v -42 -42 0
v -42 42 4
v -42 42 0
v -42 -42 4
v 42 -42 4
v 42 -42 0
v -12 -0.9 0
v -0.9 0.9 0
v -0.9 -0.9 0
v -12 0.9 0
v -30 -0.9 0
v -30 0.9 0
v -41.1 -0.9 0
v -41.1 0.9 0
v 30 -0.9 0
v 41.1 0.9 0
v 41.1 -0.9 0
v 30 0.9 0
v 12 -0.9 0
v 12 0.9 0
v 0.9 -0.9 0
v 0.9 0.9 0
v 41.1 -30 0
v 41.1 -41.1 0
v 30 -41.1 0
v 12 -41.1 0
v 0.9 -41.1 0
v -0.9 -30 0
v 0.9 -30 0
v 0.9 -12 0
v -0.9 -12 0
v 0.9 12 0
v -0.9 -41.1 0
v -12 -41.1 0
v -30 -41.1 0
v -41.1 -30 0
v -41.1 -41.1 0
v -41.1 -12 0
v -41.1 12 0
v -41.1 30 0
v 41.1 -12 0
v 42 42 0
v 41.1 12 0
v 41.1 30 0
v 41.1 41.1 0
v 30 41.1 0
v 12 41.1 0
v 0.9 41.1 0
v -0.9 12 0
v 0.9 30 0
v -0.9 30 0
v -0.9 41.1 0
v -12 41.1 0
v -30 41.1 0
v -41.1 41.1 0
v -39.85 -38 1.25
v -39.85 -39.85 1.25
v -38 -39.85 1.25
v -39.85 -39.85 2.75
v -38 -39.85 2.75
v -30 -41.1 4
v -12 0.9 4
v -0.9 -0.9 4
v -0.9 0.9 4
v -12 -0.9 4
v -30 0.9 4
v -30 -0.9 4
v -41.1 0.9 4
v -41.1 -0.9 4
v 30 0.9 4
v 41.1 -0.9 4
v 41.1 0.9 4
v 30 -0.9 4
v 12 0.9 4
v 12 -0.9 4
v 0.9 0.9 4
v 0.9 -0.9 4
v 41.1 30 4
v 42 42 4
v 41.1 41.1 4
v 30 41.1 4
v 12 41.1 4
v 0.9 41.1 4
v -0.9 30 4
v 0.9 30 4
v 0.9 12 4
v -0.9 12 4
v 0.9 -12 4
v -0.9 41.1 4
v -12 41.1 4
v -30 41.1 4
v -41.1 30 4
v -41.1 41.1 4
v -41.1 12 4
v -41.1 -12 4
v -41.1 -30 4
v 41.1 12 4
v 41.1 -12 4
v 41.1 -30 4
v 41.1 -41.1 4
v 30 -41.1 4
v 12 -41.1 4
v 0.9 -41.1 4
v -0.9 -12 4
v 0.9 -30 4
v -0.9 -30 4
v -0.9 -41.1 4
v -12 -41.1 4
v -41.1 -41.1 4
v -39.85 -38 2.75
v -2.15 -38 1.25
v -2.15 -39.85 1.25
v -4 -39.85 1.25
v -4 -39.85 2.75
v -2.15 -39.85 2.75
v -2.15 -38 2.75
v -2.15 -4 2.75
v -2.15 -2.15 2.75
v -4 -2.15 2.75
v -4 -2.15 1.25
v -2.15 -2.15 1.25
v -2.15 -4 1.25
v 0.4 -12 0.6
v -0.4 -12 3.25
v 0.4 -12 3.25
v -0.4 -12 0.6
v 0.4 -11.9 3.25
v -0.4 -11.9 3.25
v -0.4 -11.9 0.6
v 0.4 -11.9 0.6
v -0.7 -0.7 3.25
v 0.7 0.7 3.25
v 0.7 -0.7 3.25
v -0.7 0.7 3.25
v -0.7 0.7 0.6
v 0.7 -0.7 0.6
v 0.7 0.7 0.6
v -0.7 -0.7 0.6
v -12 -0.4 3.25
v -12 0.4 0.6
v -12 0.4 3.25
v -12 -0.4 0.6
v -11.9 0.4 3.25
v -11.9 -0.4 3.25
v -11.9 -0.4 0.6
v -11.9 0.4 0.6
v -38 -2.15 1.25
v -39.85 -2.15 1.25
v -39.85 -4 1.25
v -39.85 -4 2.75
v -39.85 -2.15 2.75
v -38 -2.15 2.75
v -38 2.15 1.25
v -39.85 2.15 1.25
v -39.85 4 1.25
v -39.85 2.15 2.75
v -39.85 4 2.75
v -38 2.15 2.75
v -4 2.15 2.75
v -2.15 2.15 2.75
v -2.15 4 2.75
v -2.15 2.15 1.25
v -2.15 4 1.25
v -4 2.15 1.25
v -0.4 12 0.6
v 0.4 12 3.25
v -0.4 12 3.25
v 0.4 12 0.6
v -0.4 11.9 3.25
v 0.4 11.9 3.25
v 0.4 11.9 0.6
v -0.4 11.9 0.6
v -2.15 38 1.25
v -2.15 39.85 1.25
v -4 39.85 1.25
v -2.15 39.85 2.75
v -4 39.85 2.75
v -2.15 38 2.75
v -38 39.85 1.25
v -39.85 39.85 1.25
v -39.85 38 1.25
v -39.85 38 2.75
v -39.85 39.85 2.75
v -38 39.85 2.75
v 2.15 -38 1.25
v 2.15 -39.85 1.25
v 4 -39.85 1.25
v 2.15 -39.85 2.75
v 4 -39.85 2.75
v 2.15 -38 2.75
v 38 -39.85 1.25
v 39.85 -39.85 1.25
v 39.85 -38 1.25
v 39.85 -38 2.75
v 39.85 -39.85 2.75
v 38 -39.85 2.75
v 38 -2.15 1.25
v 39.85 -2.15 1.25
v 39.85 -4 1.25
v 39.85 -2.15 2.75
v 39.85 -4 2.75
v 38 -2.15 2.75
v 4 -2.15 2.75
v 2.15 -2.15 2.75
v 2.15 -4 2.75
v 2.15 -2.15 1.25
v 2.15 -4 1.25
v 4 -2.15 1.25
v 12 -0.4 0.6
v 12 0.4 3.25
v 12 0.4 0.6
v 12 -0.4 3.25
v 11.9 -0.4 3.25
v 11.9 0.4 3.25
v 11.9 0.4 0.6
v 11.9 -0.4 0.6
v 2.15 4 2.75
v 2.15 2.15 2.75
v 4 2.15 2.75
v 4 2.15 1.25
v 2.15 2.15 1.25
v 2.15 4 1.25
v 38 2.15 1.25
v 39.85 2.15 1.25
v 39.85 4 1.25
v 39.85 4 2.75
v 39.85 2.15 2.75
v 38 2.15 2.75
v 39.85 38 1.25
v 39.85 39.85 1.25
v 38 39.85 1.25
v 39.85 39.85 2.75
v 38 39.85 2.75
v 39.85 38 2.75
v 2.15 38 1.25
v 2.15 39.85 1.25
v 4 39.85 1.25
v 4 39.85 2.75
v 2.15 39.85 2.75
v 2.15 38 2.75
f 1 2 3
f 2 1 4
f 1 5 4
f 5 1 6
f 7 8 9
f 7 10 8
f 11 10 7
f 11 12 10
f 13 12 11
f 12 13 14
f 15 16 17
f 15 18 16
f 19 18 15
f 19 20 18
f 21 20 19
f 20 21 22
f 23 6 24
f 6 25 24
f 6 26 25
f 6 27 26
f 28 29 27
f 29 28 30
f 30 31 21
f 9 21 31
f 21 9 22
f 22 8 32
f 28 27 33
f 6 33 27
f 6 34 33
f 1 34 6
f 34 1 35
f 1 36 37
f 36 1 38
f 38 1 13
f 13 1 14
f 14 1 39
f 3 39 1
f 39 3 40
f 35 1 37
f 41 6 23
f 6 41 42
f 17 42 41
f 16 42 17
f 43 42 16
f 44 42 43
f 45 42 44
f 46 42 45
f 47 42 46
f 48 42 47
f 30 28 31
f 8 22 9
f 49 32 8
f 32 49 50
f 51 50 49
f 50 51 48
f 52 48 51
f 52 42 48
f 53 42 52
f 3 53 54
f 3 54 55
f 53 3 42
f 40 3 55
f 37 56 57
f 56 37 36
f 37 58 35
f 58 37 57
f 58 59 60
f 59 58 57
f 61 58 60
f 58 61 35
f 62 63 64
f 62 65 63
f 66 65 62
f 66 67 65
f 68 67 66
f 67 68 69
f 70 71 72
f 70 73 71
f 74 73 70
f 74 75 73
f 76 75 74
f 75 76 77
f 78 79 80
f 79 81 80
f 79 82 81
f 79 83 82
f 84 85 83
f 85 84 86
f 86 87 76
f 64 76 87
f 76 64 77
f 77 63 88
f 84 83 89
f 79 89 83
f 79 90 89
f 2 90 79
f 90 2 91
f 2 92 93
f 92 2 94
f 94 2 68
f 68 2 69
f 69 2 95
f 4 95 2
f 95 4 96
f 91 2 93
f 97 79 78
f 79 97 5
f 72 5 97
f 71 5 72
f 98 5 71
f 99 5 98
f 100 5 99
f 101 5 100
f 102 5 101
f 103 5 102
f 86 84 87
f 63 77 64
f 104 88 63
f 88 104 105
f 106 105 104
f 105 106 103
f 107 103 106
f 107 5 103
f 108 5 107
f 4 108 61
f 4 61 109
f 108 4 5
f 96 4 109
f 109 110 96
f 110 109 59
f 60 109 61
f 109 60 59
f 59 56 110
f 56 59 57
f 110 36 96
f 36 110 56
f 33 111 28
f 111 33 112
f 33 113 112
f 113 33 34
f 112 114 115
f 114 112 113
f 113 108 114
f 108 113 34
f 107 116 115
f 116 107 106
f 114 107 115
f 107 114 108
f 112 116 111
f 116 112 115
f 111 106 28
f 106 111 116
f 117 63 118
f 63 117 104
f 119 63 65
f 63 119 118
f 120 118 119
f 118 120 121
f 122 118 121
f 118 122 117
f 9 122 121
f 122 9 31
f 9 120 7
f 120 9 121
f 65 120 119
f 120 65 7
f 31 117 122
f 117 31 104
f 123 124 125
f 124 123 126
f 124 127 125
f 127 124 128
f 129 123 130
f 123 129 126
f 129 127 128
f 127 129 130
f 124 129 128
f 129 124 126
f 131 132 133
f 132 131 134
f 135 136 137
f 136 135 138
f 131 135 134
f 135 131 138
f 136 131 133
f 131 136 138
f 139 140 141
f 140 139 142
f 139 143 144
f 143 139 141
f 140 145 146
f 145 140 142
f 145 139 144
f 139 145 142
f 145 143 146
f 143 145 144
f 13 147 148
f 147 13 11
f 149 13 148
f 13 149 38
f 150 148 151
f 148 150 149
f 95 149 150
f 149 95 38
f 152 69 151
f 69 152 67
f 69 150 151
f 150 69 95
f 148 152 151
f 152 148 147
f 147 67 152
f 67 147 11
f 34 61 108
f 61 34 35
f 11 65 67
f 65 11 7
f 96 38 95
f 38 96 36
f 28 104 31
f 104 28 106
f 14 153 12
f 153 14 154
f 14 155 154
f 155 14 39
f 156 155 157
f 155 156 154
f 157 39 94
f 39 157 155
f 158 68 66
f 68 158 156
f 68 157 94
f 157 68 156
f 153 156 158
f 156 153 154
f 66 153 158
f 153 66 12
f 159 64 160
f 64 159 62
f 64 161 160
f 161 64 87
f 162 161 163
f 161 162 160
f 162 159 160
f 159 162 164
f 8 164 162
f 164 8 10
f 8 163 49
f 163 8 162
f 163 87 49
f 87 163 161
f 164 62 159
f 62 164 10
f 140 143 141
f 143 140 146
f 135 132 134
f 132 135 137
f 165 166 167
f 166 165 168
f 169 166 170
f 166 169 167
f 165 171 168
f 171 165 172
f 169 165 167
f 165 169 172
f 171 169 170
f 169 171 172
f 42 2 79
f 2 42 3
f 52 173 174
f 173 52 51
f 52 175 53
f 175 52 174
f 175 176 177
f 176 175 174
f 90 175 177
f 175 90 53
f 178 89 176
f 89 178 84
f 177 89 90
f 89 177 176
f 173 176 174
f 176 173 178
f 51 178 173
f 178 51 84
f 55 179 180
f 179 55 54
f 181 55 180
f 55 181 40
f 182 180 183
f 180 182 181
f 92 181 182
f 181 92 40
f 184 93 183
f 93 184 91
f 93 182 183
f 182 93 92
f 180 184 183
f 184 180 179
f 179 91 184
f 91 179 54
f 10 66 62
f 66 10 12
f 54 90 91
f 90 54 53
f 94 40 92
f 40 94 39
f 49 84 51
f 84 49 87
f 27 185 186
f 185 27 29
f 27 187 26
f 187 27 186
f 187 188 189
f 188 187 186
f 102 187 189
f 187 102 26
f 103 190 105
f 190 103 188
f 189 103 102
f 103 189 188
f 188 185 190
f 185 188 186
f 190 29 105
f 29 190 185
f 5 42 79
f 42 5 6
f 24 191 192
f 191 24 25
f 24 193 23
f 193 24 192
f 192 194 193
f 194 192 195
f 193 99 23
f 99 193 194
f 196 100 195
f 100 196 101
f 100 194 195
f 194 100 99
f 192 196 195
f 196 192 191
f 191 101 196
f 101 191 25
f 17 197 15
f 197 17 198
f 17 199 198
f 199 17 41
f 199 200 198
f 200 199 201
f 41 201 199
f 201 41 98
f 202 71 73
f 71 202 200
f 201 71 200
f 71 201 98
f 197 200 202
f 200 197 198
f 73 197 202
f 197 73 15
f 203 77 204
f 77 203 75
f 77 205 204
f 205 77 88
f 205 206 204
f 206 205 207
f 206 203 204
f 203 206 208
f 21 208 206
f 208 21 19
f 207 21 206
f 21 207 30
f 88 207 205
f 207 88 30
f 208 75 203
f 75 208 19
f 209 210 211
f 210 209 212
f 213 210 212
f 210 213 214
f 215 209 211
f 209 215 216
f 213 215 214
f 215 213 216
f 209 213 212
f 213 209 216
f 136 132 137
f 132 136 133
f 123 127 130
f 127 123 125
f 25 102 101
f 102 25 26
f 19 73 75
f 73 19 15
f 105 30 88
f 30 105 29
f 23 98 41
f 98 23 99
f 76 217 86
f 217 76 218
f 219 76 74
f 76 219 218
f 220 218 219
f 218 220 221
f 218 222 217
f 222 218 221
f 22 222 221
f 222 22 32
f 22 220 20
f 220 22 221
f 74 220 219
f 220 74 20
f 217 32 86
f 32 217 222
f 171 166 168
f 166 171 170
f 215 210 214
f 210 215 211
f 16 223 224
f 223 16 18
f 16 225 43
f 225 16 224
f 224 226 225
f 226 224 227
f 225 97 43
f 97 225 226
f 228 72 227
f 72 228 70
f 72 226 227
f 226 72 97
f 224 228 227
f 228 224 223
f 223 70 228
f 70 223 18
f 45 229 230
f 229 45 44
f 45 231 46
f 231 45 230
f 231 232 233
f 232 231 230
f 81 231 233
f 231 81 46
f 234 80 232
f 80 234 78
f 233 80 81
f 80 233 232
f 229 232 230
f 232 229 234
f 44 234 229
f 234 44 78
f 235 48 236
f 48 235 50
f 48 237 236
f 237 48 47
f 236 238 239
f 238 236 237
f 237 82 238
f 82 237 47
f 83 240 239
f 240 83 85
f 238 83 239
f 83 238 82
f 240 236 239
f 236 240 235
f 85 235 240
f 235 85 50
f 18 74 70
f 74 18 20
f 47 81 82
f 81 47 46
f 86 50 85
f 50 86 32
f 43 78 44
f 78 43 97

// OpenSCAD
// ============================================================
//  AT Ultra-Light Gridfinity Base  —  parametric assembler
// ============================================================
//  Self-contained: all geometry is inlined as polyhedron() below, so
//  this single file runs anywhere (incl. MakerWorld's Parametric Model
//  Maker / customizer) with no external STL dependencies.
//
//  Open in OpenSCAD, then: Window menu -> Customizer to get the
//  dropdown + sliders below. F5 = preview, F6 = render, then
//  File -> Export -> Export as STL.
// ============================================================

/* [Model] */
// Which base style to build
model = "rigid"; // [rigid:Beam, net_rigid:Beam+]

/* [Grid] */
// Squares wide
columns = 2; // [1:0.5:10]
// Squares deep
rows = 2;    // [1:0.5:10]

/* [Drawer Spacers] */
// Outward spacer on each side (mm) so the plate sits flush in a drawer. 0 = none.
// Capped at 41 mm — past that, just add another Gridfinity cell instead.
// Front is the side closest to you when you place the grid on a surface
ext_front = 0; // [0:0.5:41]
// Back is the side furthest from you
ext_back  = 0; // [0:0.5:41]
// Left will be to your left
ext_left  = 0; // [0:0.5:41]
// Right will be to your right
ext_right = 0; // [0:0.5:41]

/* [Custom Shape] */

// Remove squares from row 1 left
row_1_left = 0; // [0:1:9]
// Remove squares from row 1 right
row_1_right = 0; // [0:1:9]
// Remove squares from row 2 left
row_2_left = 0; // [0:1:9]
// Remove squares from row 2 right
row_2_right = 0; // [0:1:9]
// Remove squares from row 3 left
row_3_left = 0; // [0:1:9]
// Remove squares from row 3 right
row_3_right = 0; // [0:1:9]
// Remove squares from row 4 left
row_4_left = 0; // [0:1:9]
// Remove squares from row 4 right
row_4_right = 0; // [0:1:9]
// Remove squares from row 5 left
row_5_left = 0; // [0:1:9]
// Remove squares from row 5 right
row_5_right = 0; // [0:1:9]
// Remove squares from row 6 left
row_6_left = 0; // [0:1:9]
// Remove squares from row 6 right
row_6_right = 0; // [0:1:9]
// Remove squares from row 7 left
row_7_left = 0; // [0:1:9]
// Remove squares from row 7 right
row_7_right = 0; // [0:1:9]
// Remove squares from row 8 left
row_8_left = 0; // [0:1:9]
// Remove squares from row 8 right
row_8_right = 0; // [0:1:9]
// Remove squares from row 9 left
row_9_left = 0; // [0:1:9]
// Remove squares from row 9 right
row_9_right = 0; // [0:1:9]
// Remove squares from row 10 left
row_10_left = 0; // [0:1:9]
// Remove squares from row 10 right
row_10_right = 0; // [0:1:9]

/* [Advanced] */
// Center on the plate
centered = true;
// Grid spacing in mm (42: standard gridfinity, 84: double, 168: quad)
pitch = 42;      // [21:1:168]

// Customize the preview color to match your filament. Use standard HTML color codes: e.g. #ff0000 for red. This does not affect the model output.
preview_color = "#0099ff";

// ---- end of Customizer parameters --------------------------
// Everything below is internal. The [Hidden] group keeps these
// constants (beam_len, ext_base_len, rail_*, etc.) out of the
// OpenSCAD / MakerWorld Customizer UI.
/* [Hidden] */

// Corner footprint along an edge (mm). Solid and Solid+ share the 12mm corner.
corner_size = (model == "rigid" || model == "net_rigid") ? 12 : 5;

// Connector cross-section: width (across the edge) x height (up). Solid+ (net_rigid)
// uses the same 0.9 x 4.0 connector as Solid (rigid) — it looks just like Solid; only
// its outer-perimeter corners differ (see corner_part).
conn_w = model == "net_light" ? 0.5 :
         model == "net_heavy" ? 2.15 :
                                0.9;   // rigid + net_rigid
conn_h = (model == "rigid" || model == "net_rigid") ? 4.0 : 0.5;

// ------------------------------------------------------------
// One corner, already normalized (outer corner at the origin, in the +X +Y quadrant
// with the profile facing the cell centre). Solid (rigid) and Solid+ (net_rigid)
// distinguish corner roles by how many of the corner's two edges lie on the plate
// boundary:
//   both edges on boundary  -> `outer` corner (a true plate corner)
//   one edge on boundary    -> `innerouter` corner (sits mid-edge: one side is the
//                              perimeter wall, the other mates with the neighbouring cell)
//   neither edge on boundary -> `inner` corner (fully interior, where four cells meet)
// `outer` is true whenever at least one edge is on the boundary; `both` narrows that to a
// true plate corner. Solid+ adds the `plus` role: where the on-boundary edge is *exposed*
// (no drawer spacer) it mates with a neighbouring print, so it swaps in the special Solid+
// outer/innerouter mesh; a spacered boundary edge falls back to the plain Solid corner.
//
// The InnerOuter mesh is asymmetric — its outer (perimeter) edge runs along local +X and
// its inner (mating) edge along local +Y. rcell places every corner so local +X points at
// that corner's "canonical" boundary side; when the actual boundary edge is the *other*
// one, `swap` mirrors the mesh across its diagonal (swap X/Y) to put the perimeter wall on
// the right edge. `open` marks a corner whose two adjacent squares are present but whose
// diagonal square was removed by a Custom Shape cut (a re-entrant plate corner). Solid+
// must NOT use the fully-interior corner there: its edge-connector clip only fits an
// intersection where every square-corner presents the connectable outer profile, so any
// missing square at the intersection forces the outer piece on all corners around it.
// Plain Solid has no clip and keeps the interior corner. `plus`/`outer`/`both`/`swap`/
// `open` are supplied by rcell; the flexible-net models ignore them all.
module corner_part(plus = true, outer = true, both = true, swap = false, open = false) {
    if      (model == "net_light")                        mesh_corner_net_light();
    else if (model == "net_heavy" || model == "net_beam") mesh_corner_net_heavy();
    else if (model == "net_rigid") {
        if      (plus && both)  mesh_corner_net_rigid_outer();
        else if (plus)          diag(swap) mesh_corner_net_rigid_innerouter();
        else if (outer && both) mesh_corner_rigid_outer();
        else if (outer)         diag(swap) mesh_corner_rigid_innerouter();
        else if (open)          mesh_corner_net_rigid_outer();
        else                    mesh_corner_rigid_inner();
    }
    else {  // rigid / Solid
        if      (outer && both) mesh_corner_rigid_outer();
        else if (outer)         diag(swap) mesh_corner_rigid_innerouter();
        else                    mesh_corner_rigid_inner();
    }
}

// Mirror children across the corner's diagonal (swap X/Y) when `s` is set — used to flip an
// asymmetric InnerOuter corner so its perimeter wall lands on the correct edge.
module diag(s) {
    if (s) multmatrix([[0,1,0,0],[1,0,0,0],[0,0,1,0],[0,0,0,1]]) children();
    else   children();
}

// ------------------------------------------------------------
// Drawer-spacer extension. The source STL is a 5mm-long triangular prism authored at
// [295..300, 250..253.5, 0..3.5]. Its cross-section (in Y-Z) is a tall 3.5mm "ridge"
// face at Y=250 that tapers down to ~0.5mm at Y=253.5 — the chamfered triangle that
// lines up with a corner. The prism axis (X) is the direction it sticks outward.
ext_base_len = 5;   // authored prism length (mm); we scale this to the requested distance

// Spacer tie-rail: a beam run along the far (outer) edge of the spacers to lock the
// otherwise-cantilevered prisms together. Always the Net Heavy connector profile
// (2.15 wide across the edge x 0.5 tall), regardless of the chosen model.
rail_w = 2.15;
rail_h = 0.5;

// One extension prism, normalized so the mating face is at X=0 and the tall ridge edge
// is at Y=0, tapering toward +Y and sitting on the bed (Z 0..3.5). Stretched along +X
// (outward) to length L, with a tiny inward overlap so it welds cleanly to the plate.
module extension_part(L) {
    eps = 0.02;
    if (L > 0)
        translate([-eps, 0, 0])
            scale([(L + eps) / ext_base_len, 1, 1])
                translate([-295, -250, 0])
                    mesh_extension();
}

// The "Net Beam" model pairs the Net Heavy corner with this taller beam connector: an
// L-shaped section (a 0.5mm-thick web rising to 4mm at the outer rim, plus a 0.5mm-tall
// foot reaching 2.15mm inward). Imported rather than drawn as a cube because the profile
// isn't a box. Authored 10mm long at X 305..315, web face at Y=230, on the bed (Z 0..4).
beam = (model == "net_beam");
beam_len = 10;

// Beam normalized to web-at-Y=0, foot toward +Y, running along +X scaled to len.
module beam_x(len) {
    scale([len / beam_len, 1, 1]) translate([-305, -230, 0]) mesh_beam();
}
// Same beam turned to run along +Y with its web at X=0, foot toward +X (swap X/Y).
module beam_y(len) {
    multmatrix([[0,1,0,0],[1,0,0,0],[0,0,1,0],[0,0,0,1]]) beam_x(len);
}

// Connector beams: walls that bridge between corners along one edge, flush to the outer
// rim and sitting on the bed. Most models use a simple cube (conn_w x conn_h); Net Beam
// substitutes the imported L-section. The length is "scaled" to whatever edge it spans —
// full cells get long ones, half cells get short ones. _x runs along +X; _y along +Y.
module connector_x(len) { if (len > 0) { if (beam) beam_x(len); else cube([len, conn_w, conn_h]); } }
module connector_y(len) { if (len > 0) { if (beam) beam_y(len); else cube([conn_w, len, conn_h]); } }

// A fully-enclosed rectangular cell at grid position (i, j): 4 corners + 4 edge
// connectors. Reduces to the standard 42mm square; a trailing half column/row
// yields w or h = pitch/2 and the connector lengths shrink to fit. If a corner
// is too big for the edge (e.g. 12mm rigid corners on a 21mm half edge), the
// connector clamps to 0 and the two corners simply overlap and union.
module rcell(i, j) {
    w = col_w(i);  h = row_h(j);
    cs = corner_size;
    // Classify each cell side. A side is on the shape boundary when there is no
    // neighbouring cell on that side — either the plate rim, or a jagged step where
    // Custom Shape cuts removed the neighbour. "exposed" = boundary with no drawer
    // spacer (it butts against a neighbouring print, so it wants a Solid+ corner);
    // "blocked" = boundary with a spacer mating there (keep a plain Solid corner).
    // Spacers only run along the outermost rows/columns, so a cut-created step is
    // always exposed, never blocked.
    f = !cell_at(i, j - 1);   b = !cell_at(i, j + 1);
    l = !cell_at(i - 1, j);   r = !cell_at(i + 1, j);
    fb = f && (j == 0)         && (ext_front > 0);   fe = f && !fb;
    bb = b && (j == nrows - 1) && (ext_back  > 0);   be = b && !bb;
    lb = l && (i == 0)         && (ext_left  > 0);   le = l && !lb;
    rb = r && (i == ncols - 1) && (ext_right > 0);   re = r && !rb;
    // Diagonal neighbours: a corner with both adjacent squares present but the diagonal
    // square cut away is a re-entrant plate corner ("open" intersection) — see corner_part.
    dfl = !cell_at(i - 1, j - 1);   dfr = !cell_at(i + 1, j - 1);
    dbl = !cell_at(i - 1, j + 1);   dbr = !cell_at(i + 1, j + 1);
    // corner_part(plus, outer, both, swap, open):
    //   plus  = the on-boundary edge is exposed AND neither edge is spacered (Solid+ mate);
    //           a boundary corner with a spacer in either direction falls back to plain Solid.
    //   outer = at least one edge on the boundary; both = both edges on it (a true plate corner).
    //   swap  = the lone boundary edge is the *other* one than this corner's canonical (local
    //           +X) side, so the asymmetric InnerOuter mesh must be mirrored across its diagonal.
    //           Canonical boundary side per corner: front-left->front, front-right->right,
    //           back-right->back, back-left->left.
    //   open  = both adjacent squares present but the diagonal square is missing.
    translate([0, 0, 0])                     corner_part((fe || le) && !(fb || lb), f || l, f && l, l && !f, !f && !l && dfl);
    translate([w, 0, 0]) rotate([0, 0,  90]) corner_part((fe || re) && !(fb || rb), f || r, f && r, f && !r, !f && !r && dfr);
    translate([w, h, 0]) rotate([0, 0, 180]) corner_part((be || re) && !(bb || rb), b || r, b && r, r && !b, !b && !r && dbr);
    translate([0, h, 0]) rotate([0, 0, 270]) corner_part((be || le) && !(bb || lb), b || l, b && l, b && !l, !b && !l && dbl);
    // edges, flush to the outer rim and extending inward. Mirror the top and right so
    // the (asymmetric) beam web lands on the outer rim, matching the bottom and left.
    translate([cs, 0, 0])                  connector_x(w - 2 * cs);  // bottom
    translate([cs, h, 0]) mirror([0,1,0])  connector_x(w - 2 * cs);  // top
    translate([0,  cs, 0])                 connector_y(h - 2 * cs);  // left
    translate([w,  cs, 0]) mirror([1,0,0]) connector_y(h - 2 * cs);  // right
    // Re-entrant plate corners (Custom Shape cuts only), plain Solid model: this cell
    // keeps its fully-interior corner at an open intersection, but that mesh has a
    // 0.7 x 0.7 relief notch right at the crossing point (z 0.6..3.25, clearance for
    // bin corners at a 4-cell crossing), so the two neighbours' perimeter walls meet
    // it only along a vertical line — a non-manifold pinch. Plug the notch so the
    // perimeter wall turns the corner solidly — bins never reach it (their ~3.75mm
    // corner radius keeps them well clear of the crossing point). Solid+ swaps in its
    // outer corner at open intersections and the 5mm net corners have no notch, so
    // only plain Solid needs the plug.
    if (model == "rigid") {
        np = 0.7; nz = 3.25;   // notch footprint and height, from mesh_corner_rigid_inner
        if (!f && !l && dfl) translate([0,      0,      0]) cube([np, np, nz]);
        if (!f && !r && dfr) translate([w - np, 0,      0]) cube([np, np, nz]);
        if (!b && !r && dbr) translate([w - np, h - np, 0]) cube([np, np, nz]);
        if (!b && !l && dbl) translate([0,      h - np, 0]) cube([np, np, nz]);
    }
}

// Split the (possibly fractional) grid size into whole cells plus a trailing half.
// A .5 on columns/rows means a half-cell column/row, so 2.5 -> 2 full + 1 half.
cols_full = floor(columns);
rows_full = floor(rows);
half_w = (columns - cols_full) >= 0.5;
half_h = (rows    - rows_full) >= 0.5;

// ------------------------------------------------------------
// Cell model. The grid is ncols x nrows cells; a trailing half column/row counts
// as one (narrower) cell. Custom Shape cuts remove cells from the left/right end
// of each row, so a cell exists only if its column index lands inside the row's
// surviving span. Everything downstream (corner selection, connectors, spacers)
// asks cell_at() instead of assuming a full rectangle.
ncols = cols_full + (half_w ? 1 : 0);
nrows = rows_full + (half_h ? 1 : 0);

// Per-row cut requests, row 1 (front) first. Only the first nrows entries apply.
cuts_left  = [row_1_left, row_2_left, row_3_left, row_4_left, row_5_left,
              row_6_left, row_7_left, row_8_left, row_9_left, row_10_left];
cuts_right = [row_1_right, row_2_right, row_3_right, row_4_right, row_5_right,
              row_6_right, row_7_right, row_8_right, row_9_right, row_10_right];

// Effective cuts, clamped so every row keeps at least one cell (left wins a tie).
function cutL(j) = min(cuts_left[j],  ncols - 1);
function cutR(j) = min(cuts_right[j], ncols - 1 - cutL(j));

// Does a cell exist at column i, row j? False off-grid, so neighbour probes
// like cell_at(i, j - 1) work unguarded from edge cells.
function cell_at(i, j) =
    i >= 0 && i < ncols && j >= 0 && j < nrows &&
    i >= cutL(j) && i < ncols - cutR(j);

// Cell sizes: uniform pitch except the trailing half column/row.
function col_w(i) = (half_w && i == ncols - 1) ? pitch / 2 : pitch;
function row_h(j) = (half_h && j == nrows - 1) ? pitch / 2 : pitch;

// Tile every surviving cell. Cell (i, j) sits at [i, j] * pitch (only the
// trailing column/row can be half-size, so origins stay on the pitch grid).
module grid() {
    for (i = [0 : ncols - 1], j = [0 : nrows - 1])
        if (cell_at(i, j))
            translate([i * pitch, j * pitch, 0]) rcell(i, j);
}

// ------------------------------------------------------------
// Drawer spacers.
function plate_w() = cols_full * pitch + (half_w ? pitch / 2 : 0);
function plate_h() = rows_full * pitch + (half_h ? pitch / 2 : 0);

// Lay extension prisms along each active edge, but only against cells that survived
// the Custom Shape cuts: the front/back spacers run along the present cells of the
// first/last row, and the left/right spacers only along rows whose cut on that side
// is zero (i.e. rows that actually reach that edge of the plate).
//
// Each present edge cell contributes one prism at each of its two boundary corners,
// tapering inward across the cell, plus its own stretch of tie-rail. Where two
// present cells meet, their prisms land back-to-back and mirror ridge-to-ridge into
// a single larger triangular spacer, and the rail stretches fuse — reproducing the
// old whole-edge layout on a full rectangle, while gaps and run-ends get single
// prisms and the rail stops with them.
module spacers() {
    W = plate_w(); H = plate_h();

    if (ext_front > 0)                                  // front edge (Y = 0), outward -Y
        for (i = [0 : ncols - 1]) if (cell_at(i, 0)) {
            x0 = i * pitch; x1 = x0 + col_w(i);
            translate([x0, 0, 0])                 rotate([0,0,-90]) extension_part(ext_front);
            translate([x1, 0, 0]) mirror([1,0,0]) rotate([0,0,-90]) extension_part(ext_front);
            translate([x0, -ext_front, 0]) cube([col_w(i), rail_w, rail_h]);   // tie-rail at the tips
        }

    if (ext_back > 0)                                   // back edge (Y = H), outward +Y
        for (i = [0 : ncols - 1]) if (cell_at(i, nrows - 1)) {
            x0 = i * pitch; x1 = x0 + col_w(i);
            translate([x0, H, 0]) mirror([1,0,0]) rotate([0,0, 90]) extension_part(ext_back);
            translate([x1, H, 0])                 rotate([0,0, 90]) extension_part(ext_back);
            translate([x0, H + ext_back - rail_w, 0]) cube([col_w(i), rail_w, rail_h]);
        }

    if (ext_left > 0)                                   // left edge (X = 0), outward -X
        for (j = [0 : nrows - 1]) if (cell_at(0, j)) {
            y0 = j * pitch; y1 = y0 + row_h(j);
            translate([0, y0, 0]) mirror([0,1,0]) rotate([0,0,180]) extension_part(ext_left);
            translate([0, y1, 0])                 rotate([0,0,180]) extension_part(ext_left);
            translate([-ext_left, y0, 0]) cube([rail_w, row_h(j), rail_h]);
        }

    if (ext_right > 0)                                  // right edge (X = W), outward +X
        for (j = [0 : nrows - 1]) if (cell_at(ncols - 1, j)) {
            y0 = j * pitch; y1 = y0 + row_h(j);
            translate([W, y0, 0])                 extension_part(ext_right);
            translate([W, y1, 0]) mirror([0,1,0]) extension_part(ext_right);
            translate([W + ext_right - rail_w, y0, 0]) cube([rail_w, row_h(j), rail_h]);
        }
}

// Total outer footprint, including any drawer spacers. Printed to the Console
// (View -> Console) so you can size it against your drawer before exporting.
total_w = plate_w() + ext_left + ext_right;
total_d = plate_h() + ext_front + ext_back;
echo(str("==> Width: ", total_w, " mm"));
echo(str("==> Depth: ", total_d, " mm"));

// Custom Shape sanity notes (View -> Console).
for (j = [0 : nrows - 1])
    if (cuts_left[j] != cutL(j) || cuts_right[j] != cutR(j))
        echo(str("NOTE: Row ", j + 1, " cuts clamped to keep at least one square."));
if (nrows < 10)
    for (j = [nrows : 9])
        if (cuts_left[j] > 0 || cuts_right[j] > 0)
            echo(str("NOTE: Row ", j + 1, " cuts ignored - the grid only has ", nrows, " rows."));
// Adjacent rows whose surviving spans do not overlap leave the plate in two pieces.
if (nrows > 1)
    for (j = [0 : nrows - 2])
        if (cutL(j) >= ncols - cutR(j + 1) || cutL(j + 1) >= ncols - cutR(j))
            echo(str("WARNING: Rows ", j + 1, " and ", j + 2,
                     " do not overlap - the plate will be disconnected."));

// The whole assembly. Optionally shifted so its X/Y footprint (plate plus any
// asymmetric spacers) is centered on the origin; Z is left sitting on the bed.
module assembly() { grid(); spacers(); }

color(preview_color) {
    if (centered)
        translate([(ext_left - ext_right - plate_w()) / 2,
                   (ext_front - ext_back - plate_h()) / 2, 0])
            assembly();
    else
        assembly();
}

// ============================================================
//  INLINED GEOMETRY
// ============================================================
//  Each module below is generated from the STL named in its `// source-stl:` comment
//  by tools/inline_stls.py. Do NOT hand-edit the polyhedron data — edit the STL in
//  stl/ and re-run `python3 tools/inline_stls.py`. Winding is reversed from the source
//  (STL is CCW-from-outside; OpenSCAD polyhedron() wants CW); `(normalize)` shifts a
//  corner mesh so its outer corner sits at the origin in the +X +Y quadrant.
// ============================================================

// source-stl: AT Net Light Corner.stl (normalize)
module mesh_corner_net_light() {
  polyhedron(
    points=[[2.15,5,2.75], [2.15,4,2.75], [2.15,4,2.15], [2.15,5,2.15], [1.9,5,3], [1.9,4,3], [0.5,4,3], [0.5,4,0.5], [0.5,5,0.5], [0,5,3], [0,5,0], [0.5,5,0], [0.5,0.5,3], [0.5,0.5,0], [0,0,0], [0,0,3], [5,0,0], [5,0.5,0], [5,0,3], [4,0.5,3], [5,1.9,3], [4,1.9,3], [4,0.5,0.5], [5,0.5,0.5], [5,2.15,2.1184], [5,2.15,2.75], [4,2.15,2.75], [4,2.15,2.1184]],
    faces=[[0,2,1], [2,0,3], [4,1,5], [1,4,0], [6,1,2], [6,2,7], [1,6,5], [2,8,7], [8,2,3], [9,0,4], [10,8,9], [0,9,3], [3,9,8], [8,10,11], [12,7,13], [11,7,8], [7,11,13], [7,12,6], [9,14,10], [14,9,15], [16,13,14], [10,13,11], [13,10,14], [13,16,17], [15,16,14], [16,15,18], [4,6,9], [15,6,12], [15,19,18], [20,19,21], [6,15,9], [19,20,18], [19,15,12], [6,4,5], [17,22,13], [12,22,19], [22,12,13], [22,17,23], [18,24,23], [24,18,25], [16,23,17], [23,16,18], [25,18,20], [19,27,26], [19,26,21], [27,19,22], [26,20,21], [20,26,25], [25,27,24], [27,25,26], [24,22,23], [22,24,27]], convexity=6);
}

// source-stl: AT Net Heavy Corner.stl (normalize)
module mesh_corner_net_heavy() {
  polyhedron(
    points=[[4,0.5,3], [4,0.5,0.5], [0.5,0.5,0.5], [0.5,0.5,3], [0.5,4,0.5], [0.5,4,3], [2.15,2.15,0.5], [4,2.15,0.5], [2.15,4,0.5], [2.15,4,2.75], [1.9,4,3], [4,1.9,3], [4,2.15,2.75], [5,1.9,3], [5,2.15,2.75], [5,2.15,0], [2.15,2.15,0], [2.15,5,0], [2.15,5,2.75], [1.9,5,3], [5,0,0], [5,0,3], [0,5,3], [0,0,3], [0,0,0], [0,5,0]],
    faces=[[0,2,1], [2,0,3], [3,4,2], [4,3,5], [4,6,2], [1,6,7], [6,1,2], [6,4,8], [4,9,8], [9,4,5], [9,5,10], [1,12,11], [1,11,0], [12,1,7], [11,14,13], [14,11,12], [14,7,15], [16,7,6], [7,16,15], [7,14,12], [16,8,17], [18,8,9], [8,18,17], [8,16,6], [19,9,10], [9,19,18], [20,14,15], [14,20,13], [13,20,21], [19,5,22], [23,5,3], [23,0,21], [13,0,11], [5,23,22], [0,13,21], [0,23,3], [5,19,10], [20,16,24], [25,16,17], [16,25,24], [16,20,15], [25,18,22], [22,18,19], [18,25,17], [23,20,24], [20,23,21], [22,24,25], [24,22,23]], convexity=6);
}

// source-stl: AT Net Rigid Outer Corner.stl (normalize)
module mesh_corner_net_rigid_outer() {
  polyhedron(
    points=[[4,0,4], [12,0,4], [12,0.9,4], [4,0.9,4], [5,2.15,2.75], [4,2.15,2.75], [12,0.9,0], [5,2.15,0], [12,0,0], [4,2.15,0.5], [2.15,2.15,0], [2.15,2.15,0.5], [4,0.5,0.5], [4,0.5,3], [4,0,3], [0,0,0], [0,0,3], [0.5,0.5,0.5], [0.5,0.5,3], [0.5,4,0.5], [2.15,4,0.5], [0,4,3], [0.5,4,3], [0,12,0], [0.9,12,0], [2.15,5,0], [0,12,4], [0,4,4], [0.9,12,4], [2.15,4,2.75], [0.9,4,4], [2.15,5,2.75]],
    faces=[[0,2,1], [2,0,3], [3,4,2], [4,3,5], [6,4,7], [4,6,2], [6,1,2], [1,6,8], [4,9,7], [10,9,11], [9,10,7], [9,4,5], [12,5,13], [0,13,3], [5,12,9], [13,5,3], [13,0,14], [15,14,8], [1,14,0], [14,1,8], [14,15,16], [13,17,12], [17,13,18], [19,11,17], [12,11,9], [11,12,17], [11,19,20], [21,18,16], [14,18,13], [18,14,16], [18,21,22], [17,22,19], [22,17,18], [8,7,15], [23,25,24], [15,7,10], [25,23,15], [25,15,10], [7,8,6], [26,21,23], [15,21,16], [21,15,23], [21,26,27], [26,24,28], [24,26,23], [19,29,20], [29,22,30], [27,22,21], [22,27,30], [29,19,22], [10,20,25], [31,20,29], [20,31,25], [20,10,11], [28,27,26], [27,28,30], [30,31,29], [31,30,28], [24,31,28], [31,24,25]], convexity=6);
}

// source-stl: AT Rigid InnerOuter Corner.stl (normalize)
module mesh_corner_rigid_innerouter() {
  polyhedron(
    points=[[0.9,12,0], [0,12,0], [0,12,4], [0.9,12,4], [0,0,4], [0,0,0], [12,0,0], [12,0,4], [12,0.9,0], [12,0.9,4], [0.9,0.9,0], [2.15,4,1.25], [2.15,2.15,1.25], [4,2.15,1.25], [4,2.15,2.75], [2.15,2.15,2.75], [0.9,0.9,4], [2.15,4,2.75]],
    faces=[[0,2,1], [2,0,3], [4,1,2], [1,4,5], [5,7,6], [7,5,4], [8,7,9], [7,8,6], [6,10,5], [1,10,0], [10,1,5], [10,6,8], [10,11,0], [11,10,12], [10,13,12], [13,10,8], [14,12,13], [12,14,15], [8,14,13], [14,8,9], [2,16,4], [7,16,9], [16,7,4], [16,2,3], [16,17,15], [17,16,3], [16,14,9], [14,16,15], [11,15,17], [15,11,12], [3,11,17], [11,3,0]], convexity=6);
}

// source-stl: AT Net Rigid InnerOuter Corner.stl (normalize)
module mesh_corner_net_rigid_innerouter() {
  polyhedron(
    points=[[4,0,4], [12,0,4], [12,0.9,4], [4,0.9,4], [5,2.15,2.75], [4,2.15,2.75], [12,0.9,0], [5,2.15,0], [12,0,0], [4,2.15,0.5], [2.15,2.15,0], [2.15,2.15,0.5], [4,0.5,0.5], [4,0.5,3], [4,0,3], [0,0,0], [0,0,3], [0.5,0.5,0.5], [0.5,0.5,3], [0.5,4,0.5], [2.15,4,0.5], [0,4,3], [0.5,4,3], [0,12,0], [0.9,12,0], [2.15,5,0], [0,12,4], [0,4,4], [0.9,12,4], [2.15,4,2.75], [0.9,4,4], [2.15,5,2.75]],
    faces=[[0,2,1], [2,0,3], [3,4,2], [4,3,5], [6,4,7], [4,6,2], [6,1,2], [1,6,8], [4,9,7], [10,9,11], [9,10,7], [9,4,5], [12,5,13], [0,13,3], [5,12,9], [13,5,3], [13,0,14], [15,14,8], [1,14,0], [14,1,8], [14,15,16], [13,17,12], [17,13,18], [19,11,17], [12,11,9], [11,12,17], [11,19,20], [21,18,16], [14,18,13], [18,14,16], [18,21,22], [17,22,19], [22,17,18], [8,7,15], [23,25,24], [15,7,10], [25,23,15], [25,15,10], [7,8,6], [26,21,23], [15,21,16], [21,15,23], [21,26,27], [26,24,28], [24,26,23], [19,29,20], [29,22,30], [27,22,21], [22,27,30], [29,19,22], [10,20,25], [31,20,29], [20,31,25], [20,10,11], [28,27,26], [27,28,30], [30,31,29], [31,30,28], [24,31,28], [31,24,25]], convexity=6);
}

// source-stl: AT Rigid Inner Corner.stl (normalize)
module mesh_corner_rigid_inner() {
  polyhedron(
    points=[[0.9,0.9,4], [2.15,2.15,2.75], [2.15,4,2.75], [0.9,12,4], [12,0.9,4], [4,2.15,2.75], [4,2.15,1.25], [2.15,2.15,1.25], [2.15,4,1.25], [0.9,0.9,0], [0.9,12,0], [12,0.9,0], [12,0,0], [0,0,0], [0,12,0], [0,12,4], [0,0,4], [12,0,4], [0.4,12,3.25], [0.4,12,0.6], [0,12,0.6], [0,12,3.25], [0.4,11.9,3.25], [0,11.9,3.25], [0,11.9,0.6], [0.4,11.9,0.6], [0,0.7,3.25], [0,0.7,0.6], [0,0,0.6], [0,0,3.25], [0.7,0.7,3.25], [0.7,0,3.25], [0.7,0.7,0.6], [0.7,0,0.6], [11.9,0,0.6], [12,0,0.6], [11.9,0,3.25], [12,0,3.25], [12,0.4,0.6], [12,0.4,3.25], [11.9,0.4,3.25], [11.9,0.4,0.6]],
    faces=[[0,2,1], [2,0,3], [0,5,4], [5,0,1], [5,7,6], [7,5,1], [8,1,2], [1,8,7], [9,8,10], [8,9,7], [9,6,7], [6,9,11], [11,5,6], [5,11,4], [3,8,2], [8,3,10], [12,9,13], [14,9,10], [9,14,13], [9,12,11], [15,0,16], [17,0,4], [0,17,16], [0,15,3], [15,18,3], [10,18,19], [18,10,3], [14,19,20], [19,14,10], [18,15,21], [22,21,23], [21,22,18], [20,25,24], [25,20,19], [22,24,25], [24,22,23], [22,19,18], [19,22,25], [16,26,23], [27,23,26], [23,27,24], [13,27,28], [14,24,13], [27,13,24], [26,16,29], [15,23,21], [23,15,16], [24,14,20], [30,29,31], [29,30,26], [32,28,27], [28,32,33], [31,32,30], [32,31,33], [26,32,27], [32,26,30], [31,34,33], [12,34,35], [13,33,12], [34,12,33], [34,31,36], [16,31,29], [17,36,16], [31,16,36], [33,13,28], [36,17,37], [12,38,11], [11,39,4], [39,11,38], [17,39,37], [39,17,4], [38,12,35], [39,36,37], [36,39,40], [34,38,35], [38,34,41], [40,38,41], [38,40,39], [36,41,34], [41,36,40]], convexity=6);
}

// source-stl: AT Rigid Outer Corner.stl (normalize)
module mesh_corner_rigid_outer() {
  polyhedron(
    points=[[0.9,12,0], [0,12,0], [0,12,4], [0.9,12,4], [0,0,4], [0,0,0], [12,0,0], [12,0,4], [12,0.9,0], [12,0.9,4], [0.9,0.9,0], [2.15,4,1.25], [2.15,2.15,1.25], [4,2.15,1.25], [4,2.15,2.75], [2.15,2.15,2.75], [0.9,0.9,4], [2.15,4,2.75]],
    faces=[[0,2,1], [2,0,3], [4,1,2], [1,4,5], [5,7,6], [7,5,4], [8,7,9], [7,8,6], [6,10,5], [1,10,0], [10,1,5], [10,6,8], [10,11,0], [11,10,12], [10,13,12], [13,10,8], [14,12,13], [12,14,15], [8,14,13], [14,8,9], [2,16,4], [7,16,9], [16,7,4], [16,2,3], [16,17,15], [17,16,3], [16,14,9], [14,16,15], [11,15,17], [15,11,12], [3,11,17], [11,3,0]], convexity=6);
}

// source-stl: AT Extension.stl
module mesh_extension() {
  polyhedron(
    points=[[295,252.15,0], [300,252.15,0], [300,250,0], [295,250,0], [300,250,3], [295,250,3], [295,250.5,3], [295,252.15,0.5], [300,252.15,0.5], [300,250.5,3]],
    faces=[[0,2,1], [2,0,3], [3,4,2], [4,3,5], [3,6,5], [6,3,7], [7,3,0], [2,9,8], [2,8,1], [9,2,4], [5,9,4], [9,5,6], [6,8,9], [8,6,7], [7,1,8], [1,7,0]], convexity=6);
}

// source-stl: AT Net Heavy Beam Connector.stl
module mesh_beam() {
  polyhedron(
    points=[[305,230,0], [305,232.15,0], [315,232.15,0], [315,230,0], [305,232.15,0.5], [315,232.15,0.5], [315,230,3], [305,230,3], [305,230.5,0.5], [305,230.5,3], [315,230.5,0.5], [315,230.5,3]],
    faces=[[0,2,1], [2,0,3], [2,4,1], [4,2,5], [0,6,3], [6,0,7], [1,8,0], [7,8,9], [8,7,0], [8,1,4], [6,10,3], [2,10,5], [10,2,3], [10,6,11], [4,10,8], [10,4,5], [11,8,10], [8,11,9], [9,6,7], [6,9,11]], convexity=6);
}
